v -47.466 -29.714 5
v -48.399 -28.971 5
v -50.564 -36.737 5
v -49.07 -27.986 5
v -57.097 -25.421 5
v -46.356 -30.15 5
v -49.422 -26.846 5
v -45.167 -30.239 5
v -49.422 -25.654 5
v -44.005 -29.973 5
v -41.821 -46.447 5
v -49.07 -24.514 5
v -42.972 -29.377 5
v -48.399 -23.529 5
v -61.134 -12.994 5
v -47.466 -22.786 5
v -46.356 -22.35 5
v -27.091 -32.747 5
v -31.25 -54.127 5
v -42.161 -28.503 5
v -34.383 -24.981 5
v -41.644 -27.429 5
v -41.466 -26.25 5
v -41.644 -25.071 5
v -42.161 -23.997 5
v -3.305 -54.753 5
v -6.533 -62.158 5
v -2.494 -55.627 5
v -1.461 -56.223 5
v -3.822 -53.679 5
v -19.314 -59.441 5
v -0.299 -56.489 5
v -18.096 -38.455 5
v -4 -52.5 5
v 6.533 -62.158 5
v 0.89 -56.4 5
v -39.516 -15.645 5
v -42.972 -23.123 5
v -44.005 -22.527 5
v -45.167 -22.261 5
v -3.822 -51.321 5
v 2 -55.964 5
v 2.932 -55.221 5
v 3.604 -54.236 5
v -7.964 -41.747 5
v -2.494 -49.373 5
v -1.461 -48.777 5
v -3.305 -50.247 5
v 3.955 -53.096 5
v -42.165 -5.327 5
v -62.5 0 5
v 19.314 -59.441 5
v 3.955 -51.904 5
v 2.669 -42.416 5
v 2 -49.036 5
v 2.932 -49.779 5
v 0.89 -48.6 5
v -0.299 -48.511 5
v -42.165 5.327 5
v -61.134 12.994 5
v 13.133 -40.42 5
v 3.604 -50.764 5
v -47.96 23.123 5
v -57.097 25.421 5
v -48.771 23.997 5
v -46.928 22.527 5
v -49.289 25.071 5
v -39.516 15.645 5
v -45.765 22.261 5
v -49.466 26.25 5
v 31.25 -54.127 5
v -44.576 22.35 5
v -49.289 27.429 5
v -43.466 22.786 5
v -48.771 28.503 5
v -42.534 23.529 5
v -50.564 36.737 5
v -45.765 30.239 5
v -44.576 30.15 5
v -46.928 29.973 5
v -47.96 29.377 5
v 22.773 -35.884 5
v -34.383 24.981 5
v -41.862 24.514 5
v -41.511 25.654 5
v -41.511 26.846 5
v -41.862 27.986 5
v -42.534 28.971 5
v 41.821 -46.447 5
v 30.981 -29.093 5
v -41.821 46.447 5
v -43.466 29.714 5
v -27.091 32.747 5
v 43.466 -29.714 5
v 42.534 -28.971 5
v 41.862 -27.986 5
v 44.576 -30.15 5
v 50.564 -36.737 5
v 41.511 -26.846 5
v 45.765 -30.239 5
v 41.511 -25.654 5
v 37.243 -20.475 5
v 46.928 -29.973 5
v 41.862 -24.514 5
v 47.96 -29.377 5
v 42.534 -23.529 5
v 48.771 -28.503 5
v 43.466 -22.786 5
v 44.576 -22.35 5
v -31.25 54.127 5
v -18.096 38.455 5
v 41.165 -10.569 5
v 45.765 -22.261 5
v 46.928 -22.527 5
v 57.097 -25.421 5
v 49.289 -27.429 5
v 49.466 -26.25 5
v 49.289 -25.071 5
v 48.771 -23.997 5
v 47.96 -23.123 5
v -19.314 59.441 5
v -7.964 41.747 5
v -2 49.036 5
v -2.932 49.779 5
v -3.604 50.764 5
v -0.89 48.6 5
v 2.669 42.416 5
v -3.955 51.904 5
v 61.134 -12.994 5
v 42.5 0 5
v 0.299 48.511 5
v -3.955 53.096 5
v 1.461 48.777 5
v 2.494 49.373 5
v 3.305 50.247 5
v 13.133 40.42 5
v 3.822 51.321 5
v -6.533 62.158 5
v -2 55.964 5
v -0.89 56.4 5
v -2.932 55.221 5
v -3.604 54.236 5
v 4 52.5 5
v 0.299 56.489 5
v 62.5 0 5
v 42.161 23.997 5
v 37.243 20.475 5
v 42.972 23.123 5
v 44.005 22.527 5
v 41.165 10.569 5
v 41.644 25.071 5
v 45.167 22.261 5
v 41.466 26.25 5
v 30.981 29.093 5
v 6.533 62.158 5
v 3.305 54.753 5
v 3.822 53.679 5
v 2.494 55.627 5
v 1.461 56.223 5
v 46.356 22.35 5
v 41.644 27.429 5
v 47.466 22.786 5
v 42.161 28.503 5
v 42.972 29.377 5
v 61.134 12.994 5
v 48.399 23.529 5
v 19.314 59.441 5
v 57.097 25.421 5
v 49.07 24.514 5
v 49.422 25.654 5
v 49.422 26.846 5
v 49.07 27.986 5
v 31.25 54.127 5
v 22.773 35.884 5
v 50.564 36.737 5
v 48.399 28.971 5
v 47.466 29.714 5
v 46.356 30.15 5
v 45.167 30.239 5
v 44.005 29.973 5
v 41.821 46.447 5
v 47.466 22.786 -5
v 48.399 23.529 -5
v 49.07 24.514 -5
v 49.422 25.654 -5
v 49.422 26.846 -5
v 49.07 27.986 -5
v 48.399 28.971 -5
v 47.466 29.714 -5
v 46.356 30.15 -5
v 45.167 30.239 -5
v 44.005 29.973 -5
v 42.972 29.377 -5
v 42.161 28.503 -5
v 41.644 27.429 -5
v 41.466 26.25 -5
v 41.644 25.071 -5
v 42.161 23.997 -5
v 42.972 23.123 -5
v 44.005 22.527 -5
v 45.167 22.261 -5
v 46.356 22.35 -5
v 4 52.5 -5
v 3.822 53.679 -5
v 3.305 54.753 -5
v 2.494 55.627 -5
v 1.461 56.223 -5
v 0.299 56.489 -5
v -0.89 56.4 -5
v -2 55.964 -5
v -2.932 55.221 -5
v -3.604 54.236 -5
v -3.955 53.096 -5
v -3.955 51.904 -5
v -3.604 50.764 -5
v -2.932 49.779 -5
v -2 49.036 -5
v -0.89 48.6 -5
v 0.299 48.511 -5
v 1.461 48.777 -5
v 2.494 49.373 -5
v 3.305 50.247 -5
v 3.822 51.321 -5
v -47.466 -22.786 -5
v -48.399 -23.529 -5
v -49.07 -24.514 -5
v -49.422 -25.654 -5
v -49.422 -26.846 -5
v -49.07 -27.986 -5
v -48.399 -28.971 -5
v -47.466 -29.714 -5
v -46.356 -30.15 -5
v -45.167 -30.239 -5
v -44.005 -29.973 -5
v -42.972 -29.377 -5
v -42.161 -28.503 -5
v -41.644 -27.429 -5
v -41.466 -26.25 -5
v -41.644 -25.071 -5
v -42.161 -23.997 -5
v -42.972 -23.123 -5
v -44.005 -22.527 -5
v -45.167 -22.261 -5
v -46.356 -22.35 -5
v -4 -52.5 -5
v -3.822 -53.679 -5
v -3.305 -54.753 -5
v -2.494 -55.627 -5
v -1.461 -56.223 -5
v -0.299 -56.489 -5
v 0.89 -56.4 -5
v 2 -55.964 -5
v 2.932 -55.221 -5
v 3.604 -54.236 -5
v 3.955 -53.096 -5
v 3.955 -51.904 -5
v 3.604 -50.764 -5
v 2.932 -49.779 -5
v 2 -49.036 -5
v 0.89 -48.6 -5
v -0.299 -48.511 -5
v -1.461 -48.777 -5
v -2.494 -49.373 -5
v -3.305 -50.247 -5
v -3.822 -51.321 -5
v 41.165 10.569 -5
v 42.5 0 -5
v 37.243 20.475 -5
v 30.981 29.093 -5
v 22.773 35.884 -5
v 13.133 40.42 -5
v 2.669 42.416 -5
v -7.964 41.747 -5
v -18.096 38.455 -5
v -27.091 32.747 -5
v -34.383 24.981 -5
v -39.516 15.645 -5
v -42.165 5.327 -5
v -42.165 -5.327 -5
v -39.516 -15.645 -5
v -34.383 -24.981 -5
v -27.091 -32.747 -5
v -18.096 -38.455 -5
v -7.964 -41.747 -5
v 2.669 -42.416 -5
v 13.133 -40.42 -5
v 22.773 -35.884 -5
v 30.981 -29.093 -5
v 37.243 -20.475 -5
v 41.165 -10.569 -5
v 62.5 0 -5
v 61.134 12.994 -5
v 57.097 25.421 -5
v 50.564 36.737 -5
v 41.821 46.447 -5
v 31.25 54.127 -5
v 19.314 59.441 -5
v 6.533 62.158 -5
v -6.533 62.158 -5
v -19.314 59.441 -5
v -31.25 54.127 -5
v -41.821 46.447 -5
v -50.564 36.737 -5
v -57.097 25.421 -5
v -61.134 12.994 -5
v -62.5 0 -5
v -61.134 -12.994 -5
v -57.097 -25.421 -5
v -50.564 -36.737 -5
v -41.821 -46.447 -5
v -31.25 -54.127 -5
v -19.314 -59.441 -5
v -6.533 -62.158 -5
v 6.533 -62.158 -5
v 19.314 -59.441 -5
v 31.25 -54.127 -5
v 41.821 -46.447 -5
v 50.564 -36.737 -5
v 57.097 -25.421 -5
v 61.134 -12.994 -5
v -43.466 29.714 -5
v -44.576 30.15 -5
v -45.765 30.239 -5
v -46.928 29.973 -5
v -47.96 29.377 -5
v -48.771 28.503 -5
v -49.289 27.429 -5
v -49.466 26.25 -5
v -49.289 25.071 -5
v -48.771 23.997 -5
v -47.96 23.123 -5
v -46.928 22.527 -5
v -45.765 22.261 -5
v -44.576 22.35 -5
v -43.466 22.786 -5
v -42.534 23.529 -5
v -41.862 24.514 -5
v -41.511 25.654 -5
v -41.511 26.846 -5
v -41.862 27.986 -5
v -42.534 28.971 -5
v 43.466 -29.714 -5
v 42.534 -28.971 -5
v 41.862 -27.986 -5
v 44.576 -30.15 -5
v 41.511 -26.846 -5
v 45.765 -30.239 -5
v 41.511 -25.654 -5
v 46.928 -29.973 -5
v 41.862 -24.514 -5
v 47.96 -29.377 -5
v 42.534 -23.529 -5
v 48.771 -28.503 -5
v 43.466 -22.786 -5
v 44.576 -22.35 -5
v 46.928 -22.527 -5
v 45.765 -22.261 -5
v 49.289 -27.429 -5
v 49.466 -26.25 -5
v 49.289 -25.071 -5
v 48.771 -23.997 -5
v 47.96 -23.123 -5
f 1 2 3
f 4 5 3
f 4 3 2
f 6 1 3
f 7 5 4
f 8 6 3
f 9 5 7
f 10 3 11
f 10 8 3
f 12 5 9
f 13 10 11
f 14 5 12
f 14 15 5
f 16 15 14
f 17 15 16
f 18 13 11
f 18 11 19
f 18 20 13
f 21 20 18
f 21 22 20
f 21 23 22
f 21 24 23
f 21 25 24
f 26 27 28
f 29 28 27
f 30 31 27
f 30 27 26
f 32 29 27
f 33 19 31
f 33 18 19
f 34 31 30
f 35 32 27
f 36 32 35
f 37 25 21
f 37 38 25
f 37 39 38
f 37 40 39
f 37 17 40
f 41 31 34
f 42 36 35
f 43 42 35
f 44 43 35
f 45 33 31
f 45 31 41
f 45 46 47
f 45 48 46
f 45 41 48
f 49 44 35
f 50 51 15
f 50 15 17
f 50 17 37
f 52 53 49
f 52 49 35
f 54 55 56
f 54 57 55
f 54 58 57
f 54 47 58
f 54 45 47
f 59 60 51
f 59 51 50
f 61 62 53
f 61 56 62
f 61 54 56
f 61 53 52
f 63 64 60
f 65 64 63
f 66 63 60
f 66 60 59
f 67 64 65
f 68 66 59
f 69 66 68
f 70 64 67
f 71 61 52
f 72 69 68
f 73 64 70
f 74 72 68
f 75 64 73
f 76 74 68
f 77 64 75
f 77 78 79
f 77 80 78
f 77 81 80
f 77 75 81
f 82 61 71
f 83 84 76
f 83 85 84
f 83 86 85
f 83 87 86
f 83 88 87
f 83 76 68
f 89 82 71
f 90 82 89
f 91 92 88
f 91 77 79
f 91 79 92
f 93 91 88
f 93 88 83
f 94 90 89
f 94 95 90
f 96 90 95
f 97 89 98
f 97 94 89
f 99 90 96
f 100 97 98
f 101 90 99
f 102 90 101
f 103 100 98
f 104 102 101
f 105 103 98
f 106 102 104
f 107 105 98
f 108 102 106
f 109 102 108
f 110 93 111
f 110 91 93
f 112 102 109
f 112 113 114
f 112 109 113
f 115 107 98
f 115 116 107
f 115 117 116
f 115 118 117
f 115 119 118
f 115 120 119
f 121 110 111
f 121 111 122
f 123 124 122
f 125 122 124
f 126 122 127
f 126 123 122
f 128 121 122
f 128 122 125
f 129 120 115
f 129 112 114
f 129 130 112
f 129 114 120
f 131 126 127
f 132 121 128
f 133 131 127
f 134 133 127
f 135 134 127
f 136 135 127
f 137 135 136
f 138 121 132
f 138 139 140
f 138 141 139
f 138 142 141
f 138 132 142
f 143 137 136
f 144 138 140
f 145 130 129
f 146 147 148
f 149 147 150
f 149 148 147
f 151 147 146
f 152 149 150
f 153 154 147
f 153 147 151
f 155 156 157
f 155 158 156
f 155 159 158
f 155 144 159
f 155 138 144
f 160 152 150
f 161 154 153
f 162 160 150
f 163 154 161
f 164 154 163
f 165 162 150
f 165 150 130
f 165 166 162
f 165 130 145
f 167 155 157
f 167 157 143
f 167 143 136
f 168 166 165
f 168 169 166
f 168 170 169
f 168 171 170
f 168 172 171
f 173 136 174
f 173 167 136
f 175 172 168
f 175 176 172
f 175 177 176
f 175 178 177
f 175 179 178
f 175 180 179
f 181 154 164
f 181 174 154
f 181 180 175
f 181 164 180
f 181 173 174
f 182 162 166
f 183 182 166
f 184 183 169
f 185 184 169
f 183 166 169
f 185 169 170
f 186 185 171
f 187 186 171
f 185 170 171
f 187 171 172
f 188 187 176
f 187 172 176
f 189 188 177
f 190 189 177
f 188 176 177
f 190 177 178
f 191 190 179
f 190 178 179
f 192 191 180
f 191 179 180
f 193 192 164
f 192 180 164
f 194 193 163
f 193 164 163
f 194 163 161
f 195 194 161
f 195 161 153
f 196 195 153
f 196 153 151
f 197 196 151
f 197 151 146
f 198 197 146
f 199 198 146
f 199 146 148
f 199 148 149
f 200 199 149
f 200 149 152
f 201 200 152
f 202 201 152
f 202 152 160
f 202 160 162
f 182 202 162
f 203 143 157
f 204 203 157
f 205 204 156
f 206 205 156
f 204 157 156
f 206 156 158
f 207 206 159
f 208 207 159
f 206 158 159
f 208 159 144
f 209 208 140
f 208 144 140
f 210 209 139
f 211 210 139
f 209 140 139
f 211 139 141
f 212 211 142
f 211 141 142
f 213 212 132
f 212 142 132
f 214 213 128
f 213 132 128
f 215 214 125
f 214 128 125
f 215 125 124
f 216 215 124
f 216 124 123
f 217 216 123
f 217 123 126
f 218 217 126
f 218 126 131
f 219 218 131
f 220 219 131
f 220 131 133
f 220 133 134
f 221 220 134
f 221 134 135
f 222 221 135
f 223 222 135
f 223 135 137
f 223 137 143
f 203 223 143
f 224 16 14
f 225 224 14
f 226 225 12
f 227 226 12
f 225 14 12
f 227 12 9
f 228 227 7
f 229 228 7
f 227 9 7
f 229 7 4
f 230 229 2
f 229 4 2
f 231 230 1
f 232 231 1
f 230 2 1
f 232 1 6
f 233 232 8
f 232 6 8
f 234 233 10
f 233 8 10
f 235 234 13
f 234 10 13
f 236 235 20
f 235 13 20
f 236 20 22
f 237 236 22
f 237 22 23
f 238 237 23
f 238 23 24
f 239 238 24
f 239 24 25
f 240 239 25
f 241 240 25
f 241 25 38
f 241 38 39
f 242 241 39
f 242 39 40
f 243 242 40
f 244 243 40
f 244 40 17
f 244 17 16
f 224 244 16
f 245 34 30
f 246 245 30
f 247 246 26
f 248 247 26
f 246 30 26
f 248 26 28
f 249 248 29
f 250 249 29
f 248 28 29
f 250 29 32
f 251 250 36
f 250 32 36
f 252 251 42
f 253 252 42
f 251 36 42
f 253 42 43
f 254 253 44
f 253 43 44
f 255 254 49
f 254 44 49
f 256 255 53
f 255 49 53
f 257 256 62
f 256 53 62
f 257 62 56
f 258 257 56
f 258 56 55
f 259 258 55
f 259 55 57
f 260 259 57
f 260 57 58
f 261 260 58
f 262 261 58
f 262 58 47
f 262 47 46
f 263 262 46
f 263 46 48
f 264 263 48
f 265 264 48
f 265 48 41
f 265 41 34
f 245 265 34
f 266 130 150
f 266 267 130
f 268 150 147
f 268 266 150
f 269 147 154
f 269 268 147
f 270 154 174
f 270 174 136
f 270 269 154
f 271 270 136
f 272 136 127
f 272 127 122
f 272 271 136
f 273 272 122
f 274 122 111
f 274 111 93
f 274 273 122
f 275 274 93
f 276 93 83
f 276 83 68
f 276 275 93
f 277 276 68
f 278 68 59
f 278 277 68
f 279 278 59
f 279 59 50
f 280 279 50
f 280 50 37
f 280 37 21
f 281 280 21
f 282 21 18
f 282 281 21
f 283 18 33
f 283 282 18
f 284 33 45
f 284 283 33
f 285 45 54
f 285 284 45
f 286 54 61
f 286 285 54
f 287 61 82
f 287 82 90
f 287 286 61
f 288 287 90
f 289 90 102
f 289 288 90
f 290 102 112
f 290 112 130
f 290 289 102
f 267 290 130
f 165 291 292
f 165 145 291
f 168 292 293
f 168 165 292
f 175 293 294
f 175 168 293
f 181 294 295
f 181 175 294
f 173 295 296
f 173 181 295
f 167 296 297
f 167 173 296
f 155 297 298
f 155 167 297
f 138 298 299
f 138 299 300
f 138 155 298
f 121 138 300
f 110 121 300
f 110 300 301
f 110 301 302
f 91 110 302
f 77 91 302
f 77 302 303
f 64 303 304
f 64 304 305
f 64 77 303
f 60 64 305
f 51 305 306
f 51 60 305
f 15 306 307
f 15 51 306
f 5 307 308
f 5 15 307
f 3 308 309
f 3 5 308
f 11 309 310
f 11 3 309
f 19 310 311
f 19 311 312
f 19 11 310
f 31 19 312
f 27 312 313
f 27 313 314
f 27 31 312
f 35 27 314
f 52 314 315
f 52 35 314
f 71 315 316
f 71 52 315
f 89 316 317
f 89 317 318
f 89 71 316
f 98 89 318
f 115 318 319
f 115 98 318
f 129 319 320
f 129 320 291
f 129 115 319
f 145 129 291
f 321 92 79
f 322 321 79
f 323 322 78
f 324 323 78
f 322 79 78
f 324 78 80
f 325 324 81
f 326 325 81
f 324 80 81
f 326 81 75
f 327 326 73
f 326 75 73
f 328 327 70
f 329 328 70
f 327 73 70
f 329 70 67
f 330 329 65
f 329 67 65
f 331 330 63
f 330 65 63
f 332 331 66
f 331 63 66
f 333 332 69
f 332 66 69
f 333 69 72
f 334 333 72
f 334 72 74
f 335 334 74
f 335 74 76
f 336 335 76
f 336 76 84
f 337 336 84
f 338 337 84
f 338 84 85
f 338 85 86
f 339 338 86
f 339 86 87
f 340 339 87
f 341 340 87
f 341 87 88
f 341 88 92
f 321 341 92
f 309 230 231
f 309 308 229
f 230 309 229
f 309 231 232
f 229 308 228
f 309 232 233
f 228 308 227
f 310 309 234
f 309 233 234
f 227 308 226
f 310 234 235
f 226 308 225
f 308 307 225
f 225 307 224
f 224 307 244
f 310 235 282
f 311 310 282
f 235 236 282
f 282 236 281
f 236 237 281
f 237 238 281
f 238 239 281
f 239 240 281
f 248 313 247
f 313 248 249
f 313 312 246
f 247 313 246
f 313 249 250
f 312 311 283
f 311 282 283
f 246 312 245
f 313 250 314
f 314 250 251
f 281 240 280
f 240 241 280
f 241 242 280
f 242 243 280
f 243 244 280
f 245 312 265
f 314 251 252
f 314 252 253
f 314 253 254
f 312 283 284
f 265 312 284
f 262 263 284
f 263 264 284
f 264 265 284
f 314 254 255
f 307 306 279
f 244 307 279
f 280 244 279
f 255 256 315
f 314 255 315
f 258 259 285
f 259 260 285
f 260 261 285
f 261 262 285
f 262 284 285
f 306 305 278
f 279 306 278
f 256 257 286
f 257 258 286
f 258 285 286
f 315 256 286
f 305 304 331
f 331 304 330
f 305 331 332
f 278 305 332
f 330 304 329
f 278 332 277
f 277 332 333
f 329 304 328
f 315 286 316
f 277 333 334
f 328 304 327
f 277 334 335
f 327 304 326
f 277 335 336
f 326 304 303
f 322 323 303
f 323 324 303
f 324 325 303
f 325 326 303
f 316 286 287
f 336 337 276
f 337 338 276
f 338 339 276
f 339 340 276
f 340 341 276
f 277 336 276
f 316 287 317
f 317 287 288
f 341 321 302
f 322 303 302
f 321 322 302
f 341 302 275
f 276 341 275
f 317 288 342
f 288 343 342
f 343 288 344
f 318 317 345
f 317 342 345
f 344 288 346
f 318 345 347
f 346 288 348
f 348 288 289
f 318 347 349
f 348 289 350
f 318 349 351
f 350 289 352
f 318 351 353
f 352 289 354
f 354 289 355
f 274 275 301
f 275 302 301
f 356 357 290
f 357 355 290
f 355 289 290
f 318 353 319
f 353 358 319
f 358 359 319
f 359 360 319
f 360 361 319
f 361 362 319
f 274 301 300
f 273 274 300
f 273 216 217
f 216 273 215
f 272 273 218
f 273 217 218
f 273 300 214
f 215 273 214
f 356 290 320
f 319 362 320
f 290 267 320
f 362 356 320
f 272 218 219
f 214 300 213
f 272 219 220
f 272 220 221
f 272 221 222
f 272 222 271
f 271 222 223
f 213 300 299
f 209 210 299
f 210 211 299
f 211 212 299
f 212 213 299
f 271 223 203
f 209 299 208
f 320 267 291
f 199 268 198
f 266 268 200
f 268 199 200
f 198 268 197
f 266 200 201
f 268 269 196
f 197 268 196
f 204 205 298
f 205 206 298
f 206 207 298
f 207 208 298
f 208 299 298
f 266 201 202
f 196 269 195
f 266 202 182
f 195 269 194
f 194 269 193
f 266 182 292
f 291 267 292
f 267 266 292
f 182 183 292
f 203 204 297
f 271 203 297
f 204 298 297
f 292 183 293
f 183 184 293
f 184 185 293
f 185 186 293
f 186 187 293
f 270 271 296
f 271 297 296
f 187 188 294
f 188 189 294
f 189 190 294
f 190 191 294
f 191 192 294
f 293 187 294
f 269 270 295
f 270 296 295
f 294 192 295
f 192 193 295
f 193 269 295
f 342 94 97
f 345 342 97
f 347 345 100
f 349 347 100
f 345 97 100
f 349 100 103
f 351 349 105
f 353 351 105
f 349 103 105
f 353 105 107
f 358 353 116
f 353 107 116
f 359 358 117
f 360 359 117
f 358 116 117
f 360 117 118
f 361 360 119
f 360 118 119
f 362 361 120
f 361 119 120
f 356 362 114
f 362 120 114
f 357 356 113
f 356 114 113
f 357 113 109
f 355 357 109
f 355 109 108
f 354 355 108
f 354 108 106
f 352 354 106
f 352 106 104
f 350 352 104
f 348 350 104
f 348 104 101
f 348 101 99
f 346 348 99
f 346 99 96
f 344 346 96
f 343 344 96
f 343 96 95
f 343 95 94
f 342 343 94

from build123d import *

# Parameters (mm, degrees)
SKETCH1_R          = 62.5
SKETCH1_R_2        = 42.5
BODY_DEPTH         = 5
SKETCH2_R          = 4
CUT_EXTRUDE1_DEPTH = 11
HOLES_COUNT        = 6


with BuildPart() as part:
    # Sketch1 → Body (new body, symmetric)
    with BuildSketch(Plane.XY):
        Circle(SKETCH1_R)
        Circle(SKETCH1_R_2, mode=Mode.SUBTRACT)
    extrude(amount=BODY_DEPTH, both=True)

    # Sketch2 → Cut-Extrude1 (cut, through all)
    with BuildSketch(Plane.XY.offset(5)):
        with Locations((0, 52.5)):
            Circle(SKETCH2_R)
    cut_extrude1 = extrude(amount=-CUT_EXTRUDE1_DEPTH, mode=Mode.SUBTRACT)

    # Holes: Cut-Extrude1 ×6 about axis
    holes_axis = Axis((0, 0, 0), (0, 0, 1))
    for i in range(1, HOLES_COUNT):
        add(cut_extrude1.rotate(holes_axis, i * 360 / HOLES_COUNT), mode=Mode.SUBTRACT)


solid = part.part
